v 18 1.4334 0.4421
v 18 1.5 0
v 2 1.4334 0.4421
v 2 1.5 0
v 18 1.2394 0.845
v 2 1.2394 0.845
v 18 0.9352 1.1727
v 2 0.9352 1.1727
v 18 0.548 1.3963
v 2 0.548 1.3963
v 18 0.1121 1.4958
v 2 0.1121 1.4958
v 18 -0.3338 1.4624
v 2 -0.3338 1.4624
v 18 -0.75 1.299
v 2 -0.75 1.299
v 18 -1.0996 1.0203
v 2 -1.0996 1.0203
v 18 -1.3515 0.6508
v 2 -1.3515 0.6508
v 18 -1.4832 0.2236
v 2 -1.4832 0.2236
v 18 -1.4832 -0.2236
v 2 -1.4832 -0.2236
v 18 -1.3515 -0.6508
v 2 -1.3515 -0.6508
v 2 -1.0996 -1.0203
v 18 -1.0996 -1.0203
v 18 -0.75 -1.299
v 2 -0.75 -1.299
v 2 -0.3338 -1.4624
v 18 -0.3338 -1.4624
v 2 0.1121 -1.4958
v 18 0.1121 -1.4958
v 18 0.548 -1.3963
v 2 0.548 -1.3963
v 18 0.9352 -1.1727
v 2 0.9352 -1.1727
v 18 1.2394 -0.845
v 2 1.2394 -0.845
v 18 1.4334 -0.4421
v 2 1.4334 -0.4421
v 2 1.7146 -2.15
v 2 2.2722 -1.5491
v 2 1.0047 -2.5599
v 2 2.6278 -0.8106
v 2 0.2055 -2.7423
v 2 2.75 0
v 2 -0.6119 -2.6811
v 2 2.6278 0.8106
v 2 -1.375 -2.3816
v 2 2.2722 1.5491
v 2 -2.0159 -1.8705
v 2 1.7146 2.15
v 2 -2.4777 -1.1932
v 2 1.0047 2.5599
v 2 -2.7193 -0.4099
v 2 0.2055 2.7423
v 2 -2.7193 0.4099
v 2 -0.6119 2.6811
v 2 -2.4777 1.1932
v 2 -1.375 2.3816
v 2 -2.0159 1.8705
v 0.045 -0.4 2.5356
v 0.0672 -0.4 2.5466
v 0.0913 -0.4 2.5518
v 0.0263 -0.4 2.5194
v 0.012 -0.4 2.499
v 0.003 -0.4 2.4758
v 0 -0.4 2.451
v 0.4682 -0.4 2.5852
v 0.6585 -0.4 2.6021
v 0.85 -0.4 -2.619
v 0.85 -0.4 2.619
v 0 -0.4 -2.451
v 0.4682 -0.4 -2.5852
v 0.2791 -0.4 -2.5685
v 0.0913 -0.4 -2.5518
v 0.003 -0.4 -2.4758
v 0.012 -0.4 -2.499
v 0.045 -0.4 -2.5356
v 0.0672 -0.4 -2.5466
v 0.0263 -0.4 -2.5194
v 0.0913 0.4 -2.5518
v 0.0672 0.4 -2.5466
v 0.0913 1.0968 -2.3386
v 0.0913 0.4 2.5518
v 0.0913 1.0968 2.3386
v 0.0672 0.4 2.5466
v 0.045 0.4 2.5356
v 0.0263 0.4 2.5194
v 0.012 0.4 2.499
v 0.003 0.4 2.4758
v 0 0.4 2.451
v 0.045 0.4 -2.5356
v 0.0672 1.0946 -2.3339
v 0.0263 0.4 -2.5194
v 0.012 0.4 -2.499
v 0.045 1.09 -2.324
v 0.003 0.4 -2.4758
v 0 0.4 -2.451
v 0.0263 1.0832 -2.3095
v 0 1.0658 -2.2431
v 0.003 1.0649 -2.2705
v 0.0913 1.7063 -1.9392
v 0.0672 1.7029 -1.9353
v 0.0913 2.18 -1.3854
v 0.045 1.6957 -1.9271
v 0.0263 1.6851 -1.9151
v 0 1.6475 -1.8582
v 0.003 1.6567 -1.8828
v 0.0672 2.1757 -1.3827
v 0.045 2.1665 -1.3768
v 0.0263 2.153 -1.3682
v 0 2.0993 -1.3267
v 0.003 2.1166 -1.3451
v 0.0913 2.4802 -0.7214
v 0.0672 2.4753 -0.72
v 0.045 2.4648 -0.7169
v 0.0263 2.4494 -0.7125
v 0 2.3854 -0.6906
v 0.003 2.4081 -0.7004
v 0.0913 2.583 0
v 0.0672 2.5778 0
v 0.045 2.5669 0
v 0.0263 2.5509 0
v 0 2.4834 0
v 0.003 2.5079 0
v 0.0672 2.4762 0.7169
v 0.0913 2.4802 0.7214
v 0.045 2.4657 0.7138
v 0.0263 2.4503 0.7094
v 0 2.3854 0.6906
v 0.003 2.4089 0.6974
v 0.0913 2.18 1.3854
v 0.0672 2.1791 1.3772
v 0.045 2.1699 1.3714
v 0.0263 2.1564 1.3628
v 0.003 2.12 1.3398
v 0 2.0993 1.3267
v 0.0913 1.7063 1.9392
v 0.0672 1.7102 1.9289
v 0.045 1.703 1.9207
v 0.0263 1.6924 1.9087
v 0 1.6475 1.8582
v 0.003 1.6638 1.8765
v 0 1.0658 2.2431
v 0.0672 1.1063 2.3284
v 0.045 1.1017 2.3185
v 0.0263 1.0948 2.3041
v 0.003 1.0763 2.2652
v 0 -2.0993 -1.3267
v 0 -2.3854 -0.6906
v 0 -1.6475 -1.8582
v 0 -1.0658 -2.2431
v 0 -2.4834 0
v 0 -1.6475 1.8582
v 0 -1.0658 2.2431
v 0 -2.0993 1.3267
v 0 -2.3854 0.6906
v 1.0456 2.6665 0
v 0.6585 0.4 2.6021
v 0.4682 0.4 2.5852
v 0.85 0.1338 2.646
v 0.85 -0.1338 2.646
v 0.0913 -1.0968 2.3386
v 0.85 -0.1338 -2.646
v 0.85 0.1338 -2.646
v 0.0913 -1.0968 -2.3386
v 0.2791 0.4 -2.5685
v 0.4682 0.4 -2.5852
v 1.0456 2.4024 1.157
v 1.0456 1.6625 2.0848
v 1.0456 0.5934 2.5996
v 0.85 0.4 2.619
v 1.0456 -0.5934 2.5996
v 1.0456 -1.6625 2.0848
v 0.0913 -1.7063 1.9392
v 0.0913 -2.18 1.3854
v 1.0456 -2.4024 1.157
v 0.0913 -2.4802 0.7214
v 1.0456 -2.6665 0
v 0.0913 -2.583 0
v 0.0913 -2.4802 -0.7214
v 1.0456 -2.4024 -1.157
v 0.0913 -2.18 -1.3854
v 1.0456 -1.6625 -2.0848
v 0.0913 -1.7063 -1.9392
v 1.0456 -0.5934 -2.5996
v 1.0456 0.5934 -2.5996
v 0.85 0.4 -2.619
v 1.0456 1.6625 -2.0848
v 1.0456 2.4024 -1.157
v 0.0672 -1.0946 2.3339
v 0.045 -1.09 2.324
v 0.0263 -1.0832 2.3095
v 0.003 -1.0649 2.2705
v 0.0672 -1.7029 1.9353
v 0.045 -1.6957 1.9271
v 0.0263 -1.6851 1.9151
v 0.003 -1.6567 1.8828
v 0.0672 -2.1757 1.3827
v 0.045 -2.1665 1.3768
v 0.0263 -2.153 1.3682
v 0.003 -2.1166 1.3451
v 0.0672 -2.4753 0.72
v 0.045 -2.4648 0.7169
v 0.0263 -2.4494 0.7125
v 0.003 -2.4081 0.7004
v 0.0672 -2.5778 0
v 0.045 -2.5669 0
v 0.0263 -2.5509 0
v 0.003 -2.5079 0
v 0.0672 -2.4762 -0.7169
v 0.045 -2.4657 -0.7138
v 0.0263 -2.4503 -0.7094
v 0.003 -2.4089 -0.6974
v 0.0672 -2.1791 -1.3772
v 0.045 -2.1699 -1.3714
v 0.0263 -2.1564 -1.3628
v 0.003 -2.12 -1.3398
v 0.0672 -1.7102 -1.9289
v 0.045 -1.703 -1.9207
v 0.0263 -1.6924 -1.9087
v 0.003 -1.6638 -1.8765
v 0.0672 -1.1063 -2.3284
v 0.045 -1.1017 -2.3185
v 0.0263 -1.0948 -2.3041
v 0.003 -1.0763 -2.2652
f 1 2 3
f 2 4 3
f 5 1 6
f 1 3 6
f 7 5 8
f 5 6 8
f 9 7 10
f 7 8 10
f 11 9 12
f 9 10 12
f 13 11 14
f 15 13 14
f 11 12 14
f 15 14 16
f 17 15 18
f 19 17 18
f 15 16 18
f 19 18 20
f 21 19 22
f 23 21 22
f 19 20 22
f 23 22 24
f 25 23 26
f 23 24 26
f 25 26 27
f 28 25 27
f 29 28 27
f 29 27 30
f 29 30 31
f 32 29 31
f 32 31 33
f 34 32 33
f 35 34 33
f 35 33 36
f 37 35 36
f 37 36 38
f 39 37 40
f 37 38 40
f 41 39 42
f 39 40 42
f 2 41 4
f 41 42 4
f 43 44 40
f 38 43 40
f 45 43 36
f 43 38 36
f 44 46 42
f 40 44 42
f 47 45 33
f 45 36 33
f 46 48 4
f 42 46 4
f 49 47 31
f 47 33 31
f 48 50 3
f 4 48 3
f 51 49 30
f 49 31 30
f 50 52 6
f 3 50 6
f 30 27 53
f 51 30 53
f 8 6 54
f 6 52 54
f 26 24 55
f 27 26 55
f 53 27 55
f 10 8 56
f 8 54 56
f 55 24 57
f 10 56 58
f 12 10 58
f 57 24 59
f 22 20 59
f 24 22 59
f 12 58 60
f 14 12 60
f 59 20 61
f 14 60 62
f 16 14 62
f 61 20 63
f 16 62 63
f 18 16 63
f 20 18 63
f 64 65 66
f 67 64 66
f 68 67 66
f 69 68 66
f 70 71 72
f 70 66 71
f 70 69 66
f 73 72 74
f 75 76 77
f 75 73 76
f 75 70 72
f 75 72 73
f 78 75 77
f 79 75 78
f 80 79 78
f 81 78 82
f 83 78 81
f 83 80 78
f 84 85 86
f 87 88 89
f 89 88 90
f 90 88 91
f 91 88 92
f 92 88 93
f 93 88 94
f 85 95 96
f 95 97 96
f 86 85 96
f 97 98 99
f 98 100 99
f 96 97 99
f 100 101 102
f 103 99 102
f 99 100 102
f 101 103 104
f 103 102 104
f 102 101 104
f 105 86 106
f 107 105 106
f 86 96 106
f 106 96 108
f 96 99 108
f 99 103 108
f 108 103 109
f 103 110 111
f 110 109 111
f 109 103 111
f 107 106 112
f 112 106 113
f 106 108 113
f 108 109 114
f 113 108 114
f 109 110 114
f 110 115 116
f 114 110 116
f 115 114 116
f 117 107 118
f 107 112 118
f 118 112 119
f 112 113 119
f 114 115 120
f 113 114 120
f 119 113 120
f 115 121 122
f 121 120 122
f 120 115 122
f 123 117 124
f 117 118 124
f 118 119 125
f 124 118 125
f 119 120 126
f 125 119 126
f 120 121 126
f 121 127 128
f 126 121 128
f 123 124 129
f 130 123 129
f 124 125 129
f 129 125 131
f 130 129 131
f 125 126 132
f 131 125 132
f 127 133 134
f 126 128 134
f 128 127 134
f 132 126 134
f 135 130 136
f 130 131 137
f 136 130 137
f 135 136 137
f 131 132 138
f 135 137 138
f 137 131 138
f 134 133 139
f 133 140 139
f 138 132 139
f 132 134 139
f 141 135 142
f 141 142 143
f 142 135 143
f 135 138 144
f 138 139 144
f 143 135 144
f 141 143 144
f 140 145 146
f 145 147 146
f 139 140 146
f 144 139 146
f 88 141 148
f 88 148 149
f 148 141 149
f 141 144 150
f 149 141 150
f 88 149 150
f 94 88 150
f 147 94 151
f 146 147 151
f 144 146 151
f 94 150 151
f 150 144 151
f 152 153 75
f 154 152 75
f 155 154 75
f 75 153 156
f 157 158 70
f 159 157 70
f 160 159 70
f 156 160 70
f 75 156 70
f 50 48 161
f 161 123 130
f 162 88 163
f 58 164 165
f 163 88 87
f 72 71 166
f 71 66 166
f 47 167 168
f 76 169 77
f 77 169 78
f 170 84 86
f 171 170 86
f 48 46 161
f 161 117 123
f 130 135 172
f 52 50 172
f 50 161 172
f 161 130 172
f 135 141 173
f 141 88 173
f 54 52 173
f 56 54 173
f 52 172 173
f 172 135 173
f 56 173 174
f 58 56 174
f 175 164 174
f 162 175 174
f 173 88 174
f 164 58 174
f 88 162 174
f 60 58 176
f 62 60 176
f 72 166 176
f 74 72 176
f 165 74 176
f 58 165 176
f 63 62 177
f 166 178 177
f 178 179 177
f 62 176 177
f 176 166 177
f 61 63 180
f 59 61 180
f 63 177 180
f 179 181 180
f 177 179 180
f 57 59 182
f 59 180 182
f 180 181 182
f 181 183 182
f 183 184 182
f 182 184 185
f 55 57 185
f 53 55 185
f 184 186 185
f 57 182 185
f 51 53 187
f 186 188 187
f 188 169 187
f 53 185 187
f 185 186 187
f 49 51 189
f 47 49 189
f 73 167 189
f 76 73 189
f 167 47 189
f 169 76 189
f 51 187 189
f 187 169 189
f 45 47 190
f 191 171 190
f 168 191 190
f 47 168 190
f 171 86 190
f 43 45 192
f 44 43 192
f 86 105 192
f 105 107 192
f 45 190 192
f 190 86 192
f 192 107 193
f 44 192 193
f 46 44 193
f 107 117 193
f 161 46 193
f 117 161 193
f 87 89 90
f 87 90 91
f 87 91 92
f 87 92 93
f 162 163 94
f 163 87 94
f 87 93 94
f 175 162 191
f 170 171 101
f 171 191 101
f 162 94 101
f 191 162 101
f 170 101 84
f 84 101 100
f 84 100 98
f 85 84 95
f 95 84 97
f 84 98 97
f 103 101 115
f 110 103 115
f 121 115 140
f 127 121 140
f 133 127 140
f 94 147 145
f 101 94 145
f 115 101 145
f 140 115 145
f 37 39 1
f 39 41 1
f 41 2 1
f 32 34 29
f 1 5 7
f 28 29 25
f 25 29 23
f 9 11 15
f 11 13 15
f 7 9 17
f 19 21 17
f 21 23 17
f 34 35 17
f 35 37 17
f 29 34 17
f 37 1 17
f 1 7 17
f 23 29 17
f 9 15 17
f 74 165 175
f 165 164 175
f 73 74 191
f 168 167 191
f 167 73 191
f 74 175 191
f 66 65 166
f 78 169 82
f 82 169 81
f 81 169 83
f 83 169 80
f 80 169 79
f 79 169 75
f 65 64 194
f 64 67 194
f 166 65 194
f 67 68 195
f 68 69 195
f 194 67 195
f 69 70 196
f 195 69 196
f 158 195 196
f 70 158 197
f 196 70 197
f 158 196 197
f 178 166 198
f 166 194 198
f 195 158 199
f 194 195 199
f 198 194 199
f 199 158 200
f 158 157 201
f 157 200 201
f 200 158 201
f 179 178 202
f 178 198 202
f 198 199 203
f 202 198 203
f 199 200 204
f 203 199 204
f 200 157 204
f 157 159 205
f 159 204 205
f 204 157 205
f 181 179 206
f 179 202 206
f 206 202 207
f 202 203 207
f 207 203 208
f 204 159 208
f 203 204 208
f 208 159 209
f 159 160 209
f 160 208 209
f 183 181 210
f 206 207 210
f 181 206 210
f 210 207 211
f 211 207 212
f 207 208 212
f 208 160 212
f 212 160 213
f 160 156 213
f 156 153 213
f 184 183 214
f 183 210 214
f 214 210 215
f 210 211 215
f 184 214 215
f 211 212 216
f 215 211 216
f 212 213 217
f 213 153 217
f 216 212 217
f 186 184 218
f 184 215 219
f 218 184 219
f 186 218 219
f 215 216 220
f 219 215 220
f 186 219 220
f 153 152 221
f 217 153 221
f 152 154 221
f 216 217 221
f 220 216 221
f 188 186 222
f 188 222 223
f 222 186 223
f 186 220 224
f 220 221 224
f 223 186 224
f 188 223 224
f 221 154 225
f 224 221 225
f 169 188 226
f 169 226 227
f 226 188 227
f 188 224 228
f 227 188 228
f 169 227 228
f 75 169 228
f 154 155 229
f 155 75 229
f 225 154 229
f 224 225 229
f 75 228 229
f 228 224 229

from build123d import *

# Parameters (mm, degrees)
FILLET2_R  = 0.1
SKETCH2_W  = 5.5
SKETCH2_H  = 0.8
SLOT_DEPTH = 0.85


with BuildPart() as part:
    # BodySke → Base-Revolve (revolve)
    with BuildSketch(Plane.XY):
        Polygon((2, 1.5), (2, 2.75), (0, 2.575022673), (0, 0), (18, 0), (18, 1.5), align=None)
    revolve(axis=Axis((-25.4, 0, 0), (1, 0, 0)))

    # Fillet2
    fillet2_edges = [part.edges().sort_by_distance(p)[0] for p in [
        (0, -2.575022673, 0),
    ]]
    fillet(fillet2_edges, radius=FILLET2_R)

    # Sketch2 → Slot (cut)
    with BuildSketch(Plane(origin=(0, 0, 0), x_dir=(0, 0, -1), z_dir=(1, 0, 0))):
        Rectangle(SKETCH2_W, SKETCH2_H)
    extrude(amount=SLOT_DEPTH, mode=Mode.SUBTRACT)


solid = part.part
